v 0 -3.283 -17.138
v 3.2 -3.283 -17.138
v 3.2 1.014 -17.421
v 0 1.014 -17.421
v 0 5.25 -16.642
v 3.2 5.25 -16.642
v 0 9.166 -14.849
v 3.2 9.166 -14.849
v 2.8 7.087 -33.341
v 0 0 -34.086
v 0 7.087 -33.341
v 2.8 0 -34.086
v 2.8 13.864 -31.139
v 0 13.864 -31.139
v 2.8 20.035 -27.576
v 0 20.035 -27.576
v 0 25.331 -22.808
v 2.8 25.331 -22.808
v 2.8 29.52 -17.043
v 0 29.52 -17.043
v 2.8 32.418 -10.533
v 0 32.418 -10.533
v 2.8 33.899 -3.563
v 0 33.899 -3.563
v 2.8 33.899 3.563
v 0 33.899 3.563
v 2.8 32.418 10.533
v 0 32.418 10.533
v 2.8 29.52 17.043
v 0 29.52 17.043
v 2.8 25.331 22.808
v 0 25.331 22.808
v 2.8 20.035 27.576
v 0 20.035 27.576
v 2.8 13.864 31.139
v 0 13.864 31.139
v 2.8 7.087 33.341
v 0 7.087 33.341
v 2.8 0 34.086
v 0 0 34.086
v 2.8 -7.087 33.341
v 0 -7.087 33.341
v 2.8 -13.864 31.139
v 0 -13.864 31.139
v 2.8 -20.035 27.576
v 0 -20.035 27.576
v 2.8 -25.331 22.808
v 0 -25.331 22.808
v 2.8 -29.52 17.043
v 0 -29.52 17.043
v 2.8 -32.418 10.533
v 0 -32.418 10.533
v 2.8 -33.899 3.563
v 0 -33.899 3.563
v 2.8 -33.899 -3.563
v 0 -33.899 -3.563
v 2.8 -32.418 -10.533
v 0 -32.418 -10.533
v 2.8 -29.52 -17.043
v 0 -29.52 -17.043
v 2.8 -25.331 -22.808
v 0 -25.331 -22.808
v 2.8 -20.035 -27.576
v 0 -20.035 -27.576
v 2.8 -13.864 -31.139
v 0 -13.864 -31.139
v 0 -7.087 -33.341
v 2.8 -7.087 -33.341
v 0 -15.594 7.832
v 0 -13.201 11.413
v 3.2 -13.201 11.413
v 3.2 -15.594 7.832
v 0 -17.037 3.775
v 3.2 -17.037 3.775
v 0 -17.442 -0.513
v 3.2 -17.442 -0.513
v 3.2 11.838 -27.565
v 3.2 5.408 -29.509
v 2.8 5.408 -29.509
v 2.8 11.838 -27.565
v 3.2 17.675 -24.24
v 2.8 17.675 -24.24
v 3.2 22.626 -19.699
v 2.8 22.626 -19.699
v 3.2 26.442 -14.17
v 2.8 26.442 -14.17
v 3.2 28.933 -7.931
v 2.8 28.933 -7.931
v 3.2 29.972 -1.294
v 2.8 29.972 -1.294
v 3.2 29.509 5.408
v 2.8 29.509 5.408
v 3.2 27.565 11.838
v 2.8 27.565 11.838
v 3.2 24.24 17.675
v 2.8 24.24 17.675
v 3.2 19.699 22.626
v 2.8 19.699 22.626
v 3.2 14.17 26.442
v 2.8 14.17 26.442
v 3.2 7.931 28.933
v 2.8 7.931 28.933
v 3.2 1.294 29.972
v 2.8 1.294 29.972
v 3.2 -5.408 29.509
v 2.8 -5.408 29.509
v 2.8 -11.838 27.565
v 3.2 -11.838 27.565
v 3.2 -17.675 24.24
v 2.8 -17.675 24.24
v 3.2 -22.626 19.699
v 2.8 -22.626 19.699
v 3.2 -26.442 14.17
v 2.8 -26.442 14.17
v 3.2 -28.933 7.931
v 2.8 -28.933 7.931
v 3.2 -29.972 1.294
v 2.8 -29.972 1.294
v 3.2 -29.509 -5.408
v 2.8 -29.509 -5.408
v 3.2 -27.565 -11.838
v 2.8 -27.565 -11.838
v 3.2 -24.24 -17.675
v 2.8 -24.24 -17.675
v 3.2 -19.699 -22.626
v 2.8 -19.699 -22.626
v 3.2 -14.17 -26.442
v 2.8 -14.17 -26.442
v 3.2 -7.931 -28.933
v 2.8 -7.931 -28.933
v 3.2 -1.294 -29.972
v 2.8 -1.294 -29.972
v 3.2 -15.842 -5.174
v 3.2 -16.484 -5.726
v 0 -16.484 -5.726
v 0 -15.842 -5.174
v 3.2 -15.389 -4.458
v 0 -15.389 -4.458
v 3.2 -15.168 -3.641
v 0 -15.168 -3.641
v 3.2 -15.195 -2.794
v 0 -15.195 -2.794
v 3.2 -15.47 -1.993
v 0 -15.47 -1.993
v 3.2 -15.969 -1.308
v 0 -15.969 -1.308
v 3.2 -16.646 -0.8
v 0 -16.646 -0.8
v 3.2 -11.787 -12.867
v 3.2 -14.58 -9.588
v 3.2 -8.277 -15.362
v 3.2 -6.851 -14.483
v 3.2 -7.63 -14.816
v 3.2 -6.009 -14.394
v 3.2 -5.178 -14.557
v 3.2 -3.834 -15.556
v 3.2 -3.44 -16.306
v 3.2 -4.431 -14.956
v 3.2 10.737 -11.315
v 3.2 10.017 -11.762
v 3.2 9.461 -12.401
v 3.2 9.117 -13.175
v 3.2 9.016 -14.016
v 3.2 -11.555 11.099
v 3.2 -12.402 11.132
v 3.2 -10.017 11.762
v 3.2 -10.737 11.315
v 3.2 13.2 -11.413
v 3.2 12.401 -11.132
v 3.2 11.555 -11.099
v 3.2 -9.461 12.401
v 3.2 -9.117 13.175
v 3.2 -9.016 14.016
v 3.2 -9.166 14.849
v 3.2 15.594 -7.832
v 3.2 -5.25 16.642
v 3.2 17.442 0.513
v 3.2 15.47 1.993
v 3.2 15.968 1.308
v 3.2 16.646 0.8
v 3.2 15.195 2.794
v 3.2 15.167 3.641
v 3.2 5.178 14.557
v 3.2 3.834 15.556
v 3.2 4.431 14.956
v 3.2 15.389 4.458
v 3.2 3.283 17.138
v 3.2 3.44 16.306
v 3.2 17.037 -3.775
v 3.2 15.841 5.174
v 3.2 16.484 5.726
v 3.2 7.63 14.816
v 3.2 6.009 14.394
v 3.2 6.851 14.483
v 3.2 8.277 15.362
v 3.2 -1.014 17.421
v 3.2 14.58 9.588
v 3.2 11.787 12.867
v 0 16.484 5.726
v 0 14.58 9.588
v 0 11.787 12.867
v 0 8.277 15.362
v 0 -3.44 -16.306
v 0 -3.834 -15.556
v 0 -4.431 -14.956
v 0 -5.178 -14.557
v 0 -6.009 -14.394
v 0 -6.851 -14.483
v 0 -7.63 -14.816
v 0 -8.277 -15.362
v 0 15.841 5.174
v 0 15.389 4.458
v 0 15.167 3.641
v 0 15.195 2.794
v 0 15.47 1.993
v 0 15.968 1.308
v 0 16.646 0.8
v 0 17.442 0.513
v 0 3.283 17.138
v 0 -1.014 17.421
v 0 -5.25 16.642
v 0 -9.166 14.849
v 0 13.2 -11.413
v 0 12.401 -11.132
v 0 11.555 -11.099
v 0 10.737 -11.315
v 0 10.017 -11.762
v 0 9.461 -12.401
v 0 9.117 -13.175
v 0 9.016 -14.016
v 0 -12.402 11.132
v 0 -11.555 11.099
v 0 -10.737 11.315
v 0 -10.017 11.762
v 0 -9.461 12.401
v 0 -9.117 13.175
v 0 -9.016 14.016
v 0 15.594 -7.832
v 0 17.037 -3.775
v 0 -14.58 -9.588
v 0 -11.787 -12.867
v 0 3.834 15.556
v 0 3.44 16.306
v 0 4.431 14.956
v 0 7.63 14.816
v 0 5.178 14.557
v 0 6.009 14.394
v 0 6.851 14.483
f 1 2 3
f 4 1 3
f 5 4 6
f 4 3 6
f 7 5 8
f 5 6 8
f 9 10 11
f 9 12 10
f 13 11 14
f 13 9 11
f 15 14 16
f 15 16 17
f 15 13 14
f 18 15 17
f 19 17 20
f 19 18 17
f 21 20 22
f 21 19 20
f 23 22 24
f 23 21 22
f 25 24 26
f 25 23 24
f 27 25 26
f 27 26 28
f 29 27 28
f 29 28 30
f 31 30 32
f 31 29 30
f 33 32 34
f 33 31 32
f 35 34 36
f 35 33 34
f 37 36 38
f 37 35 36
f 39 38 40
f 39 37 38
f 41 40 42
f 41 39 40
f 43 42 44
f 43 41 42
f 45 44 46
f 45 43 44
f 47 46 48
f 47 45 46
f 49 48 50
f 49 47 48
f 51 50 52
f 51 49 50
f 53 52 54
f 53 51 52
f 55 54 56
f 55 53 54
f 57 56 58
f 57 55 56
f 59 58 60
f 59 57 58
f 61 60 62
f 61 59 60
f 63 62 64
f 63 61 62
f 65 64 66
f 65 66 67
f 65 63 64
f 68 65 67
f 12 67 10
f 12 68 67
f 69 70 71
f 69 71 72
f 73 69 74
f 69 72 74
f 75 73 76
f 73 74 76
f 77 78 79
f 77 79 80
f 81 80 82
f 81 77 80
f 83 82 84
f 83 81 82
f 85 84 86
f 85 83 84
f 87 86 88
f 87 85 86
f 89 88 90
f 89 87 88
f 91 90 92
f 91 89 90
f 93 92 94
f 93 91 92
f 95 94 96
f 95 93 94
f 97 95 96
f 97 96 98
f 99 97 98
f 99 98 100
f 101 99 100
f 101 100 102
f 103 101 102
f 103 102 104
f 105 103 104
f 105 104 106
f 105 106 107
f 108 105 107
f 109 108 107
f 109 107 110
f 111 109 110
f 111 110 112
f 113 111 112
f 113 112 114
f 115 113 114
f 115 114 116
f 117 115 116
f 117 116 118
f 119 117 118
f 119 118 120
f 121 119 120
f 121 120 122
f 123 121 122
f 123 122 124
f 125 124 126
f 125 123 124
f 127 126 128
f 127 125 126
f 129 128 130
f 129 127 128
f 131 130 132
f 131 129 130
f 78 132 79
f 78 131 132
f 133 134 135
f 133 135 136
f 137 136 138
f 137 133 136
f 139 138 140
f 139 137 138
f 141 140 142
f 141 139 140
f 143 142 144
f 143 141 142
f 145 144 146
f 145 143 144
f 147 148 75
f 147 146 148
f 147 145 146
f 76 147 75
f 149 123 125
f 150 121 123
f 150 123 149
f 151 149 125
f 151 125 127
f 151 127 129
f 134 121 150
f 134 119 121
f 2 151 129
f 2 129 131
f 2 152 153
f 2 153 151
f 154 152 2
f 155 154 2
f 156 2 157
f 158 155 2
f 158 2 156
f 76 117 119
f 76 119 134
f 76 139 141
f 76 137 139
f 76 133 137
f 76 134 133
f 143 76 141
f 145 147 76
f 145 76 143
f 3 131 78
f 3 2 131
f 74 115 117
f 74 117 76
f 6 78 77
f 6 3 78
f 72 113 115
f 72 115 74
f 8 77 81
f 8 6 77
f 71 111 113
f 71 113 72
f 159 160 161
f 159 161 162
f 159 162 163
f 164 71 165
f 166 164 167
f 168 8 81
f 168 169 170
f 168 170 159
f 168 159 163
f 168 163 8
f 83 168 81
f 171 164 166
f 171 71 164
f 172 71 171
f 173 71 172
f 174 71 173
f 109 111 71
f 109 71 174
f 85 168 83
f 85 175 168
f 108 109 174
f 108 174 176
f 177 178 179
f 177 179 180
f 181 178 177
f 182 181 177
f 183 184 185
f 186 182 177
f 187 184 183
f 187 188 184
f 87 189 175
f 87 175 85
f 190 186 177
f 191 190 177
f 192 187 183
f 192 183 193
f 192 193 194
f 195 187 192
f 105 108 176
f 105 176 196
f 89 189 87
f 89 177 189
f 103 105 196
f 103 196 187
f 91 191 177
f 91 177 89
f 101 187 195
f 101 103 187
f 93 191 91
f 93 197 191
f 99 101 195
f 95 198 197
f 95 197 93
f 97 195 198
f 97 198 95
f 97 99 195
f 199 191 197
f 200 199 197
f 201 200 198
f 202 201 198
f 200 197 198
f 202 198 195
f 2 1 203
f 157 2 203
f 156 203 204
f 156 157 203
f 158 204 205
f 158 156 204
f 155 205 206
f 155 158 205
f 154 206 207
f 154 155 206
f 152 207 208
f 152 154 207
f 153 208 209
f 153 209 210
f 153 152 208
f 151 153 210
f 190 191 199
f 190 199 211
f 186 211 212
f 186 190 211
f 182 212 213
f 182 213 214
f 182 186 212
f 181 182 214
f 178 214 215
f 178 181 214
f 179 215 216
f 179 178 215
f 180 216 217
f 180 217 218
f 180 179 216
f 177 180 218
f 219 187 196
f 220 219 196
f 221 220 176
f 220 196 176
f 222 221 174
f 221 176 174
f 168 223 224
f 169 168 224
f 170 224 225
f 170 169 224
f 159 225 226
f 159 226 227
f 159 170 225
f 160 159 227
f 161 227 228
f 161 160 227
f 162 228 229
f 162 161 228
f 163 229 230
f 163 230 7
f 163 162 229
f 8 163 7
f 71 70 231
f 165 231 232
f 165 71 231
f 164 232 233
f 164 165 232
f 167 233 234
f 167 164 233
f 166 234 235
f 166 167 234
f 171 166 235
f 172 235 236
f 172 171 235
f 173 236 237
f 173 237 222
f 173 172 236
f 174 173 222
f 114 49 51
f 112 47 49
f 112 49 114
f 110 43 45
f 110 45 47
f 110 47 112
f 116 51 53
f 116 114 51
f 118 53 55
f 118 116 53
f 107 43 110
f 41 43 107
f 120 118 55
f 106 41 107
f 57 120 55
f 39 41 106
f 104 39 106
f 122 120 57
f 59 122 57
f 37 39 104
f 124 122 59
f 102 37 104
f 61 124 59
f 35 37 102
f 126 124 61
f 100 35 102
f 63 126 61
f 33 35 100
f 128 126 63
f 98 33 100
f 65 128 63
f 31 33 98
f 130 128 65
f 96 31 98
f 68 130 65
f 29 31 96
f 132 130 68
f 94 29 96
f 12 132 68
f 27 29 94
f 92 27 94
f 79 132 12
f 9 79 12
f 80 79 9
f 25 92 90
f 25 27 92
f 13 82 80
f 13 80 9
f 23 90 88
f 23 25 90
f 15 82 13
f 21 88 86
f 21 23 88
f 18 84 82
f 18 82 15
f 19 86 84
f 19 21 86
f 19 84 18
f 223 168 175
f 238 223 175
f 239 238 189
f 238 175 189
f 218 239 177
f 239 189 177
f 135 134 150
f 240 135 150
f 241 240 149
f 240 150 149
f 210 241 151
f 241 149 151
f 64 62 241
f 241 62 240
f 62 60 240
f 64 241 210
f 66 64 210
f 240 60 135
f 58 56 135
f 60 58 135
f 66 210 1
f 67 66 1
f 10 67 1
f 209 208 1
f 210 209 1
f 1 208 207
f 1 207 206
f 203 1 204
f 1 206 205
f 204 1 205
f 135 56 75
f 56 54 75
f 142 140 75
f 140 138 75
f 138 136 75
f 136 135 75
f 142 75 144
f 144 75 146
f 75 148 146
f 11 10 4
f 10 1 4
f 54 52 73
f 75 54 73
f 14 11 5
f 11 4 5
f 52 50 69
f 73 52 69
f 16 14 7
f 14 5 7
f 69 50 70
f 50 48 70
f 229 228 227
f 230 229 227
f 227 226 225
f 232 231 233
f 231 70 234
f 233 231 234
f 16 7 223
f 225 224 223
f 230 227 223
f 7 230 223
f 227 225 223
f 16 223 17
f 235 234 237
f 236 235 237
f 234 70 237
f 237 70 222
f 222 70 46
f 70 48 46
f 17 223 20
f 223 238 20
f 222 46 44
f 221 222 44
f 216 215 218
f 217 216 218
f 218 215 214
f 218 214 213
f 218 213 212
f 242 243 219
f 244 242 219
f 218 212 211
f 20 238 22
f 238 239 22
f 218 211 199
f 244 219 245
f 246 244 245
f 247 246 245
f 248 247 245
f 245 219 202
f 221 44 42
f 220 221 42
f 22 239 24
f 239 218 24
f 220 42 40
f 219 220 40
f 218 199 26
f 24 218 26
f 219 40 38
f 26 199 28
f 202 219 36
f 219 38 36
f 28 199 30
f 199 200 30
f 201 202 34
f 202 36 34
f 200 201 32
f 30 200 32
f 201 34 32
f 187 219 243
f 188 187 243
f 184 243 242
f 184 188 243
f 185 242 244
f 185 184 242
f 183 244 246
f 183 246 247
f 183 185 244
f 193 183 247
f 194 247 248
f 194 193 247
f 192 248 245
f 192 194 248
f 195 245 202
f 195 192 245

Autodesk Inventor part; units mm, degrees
ref_plane "YZ Plane" through (0, 0, 0) normal (1, 0, 0) x (0, 1, 0)
ref_plane "XZ Plane" through (0, 0, 0) normal (0, 1, 0) x (-1, 0, 0)
ref_plane "XY Plane" through (0, 0, 0) normal (0, 0, 1) x (1, 0, 0)
sketch "Sketch_1" plane through (0, 0, 0) normal (0, 0, 1) x (1, 0, 0)
  line L0 (7.2, 0) -> (0, 0)
  line L1 (0, 8.5) -> (3.2, 8.5)
  line L2 (3.2, 8.5) -> (3.2, 105.8394)
  arc A0 (3.2, 105.8394) -> (2.2899, 109) centre (-4.7294, 105.2675) ccw
  line L3 (2.2899, 109) -> (0.7899, 109)
  arc A1 (0.7899, 109) -> (0, 105.8394) centre (7.9441, 105.5329) ccw
  line L4 (0, 105.8394) -> (0, 8.5)
  dimension "d16" = 1.5
  dimension "d17" = 3.2
revolve "Revolution1" add sketch "Sketch_1" angle 360 about axis through (7.2, 0, 0) along (1, 0, 0)
sketch "Sketch_2" plane through (3.6, 0, 0) normal (1, 0, 0) x (0, 0, -1)
  circle A0 centre (0, 0) radius 145.3333
  arc A1 (-108.9989, 0.5) -> (-108.9989, -0.5) centre (0, 0) ccw
  line L0 (-108.9989, -0.5) -> (-103.5248, -2.6502)
  arc A2 (-103.0895, -9.8477) -> (-103.5248, -2.6502) centre (-104.9781, -6.35) ccw
  line L1 (-103.0895, -9.8477) -> (-108.2644, -12.642)
  arc A3 (-108.2644, -12.642) -> (-108.1439, -13.6347) centre (0, 0) ccw
  line L2 (-108.1439, -13.6347) -> (-102.4506, -15.1094)
  arc A4 (-101.1508, -22.2019) -> (-102.4506, -15.1094) centre (-103.4473, -18.9574) ccw
  line L3 (-101.1508, -22.2019) -> (-105.9512, -25.5997)
  arc A5 (-105.9512, -25.5997) -> (-105.7119, -26.5706) centre (0, 0) ccw
  line L4 (-105.7119, -26.5706) -> (-99.8824, -27.3483)
  arc A6 (-97.7372, -34.2324) -> (-99.8824, -27.3483) centre (-100.408, -31.2884) ccw
  line L5 (-97.7372, -34.2324) -> (-102.093, -38.184)
  arc A7 (-102.093, -38.184) -> (-101.7384, -39.119) centre (0, 0) ccw
  line L6 (-101.7384, -39.119) -> (-95.8576, -39.1884)
  arc A8 (-92.8983, -45.7638) -> (-95.8576, -39.1884) centre (-95.9045, -43.1631) ccw
  line L7 (-92.8983, -45.7638) -> (-96.7461, -50.2116)
  arc A9 (-96.7461, -50.2116) -> (-96.2813, -51.097) centre (0, 0) ccw
  line L8 (-96.2813, -51.097) -> (-90.4351, -50.457)
  arc A10 (-86.7048, -56.6277) -> (-90.4351, -50.457) centre (-90.0025, -54.4084) ccw
  line L9 (-86.7048, -56.6277) -> (-89.9883, -61.5069)
  arc A11 (-89.9883, -61.5069) -> (-89.4203, -62.3299) centre (0, 0) ccw
  line L10 (-89.4203, -62.3299) -> (-83.6938, -60.9899)
  arc A12 (-79.2469, -66.666) -> (-83.6938, -60.9899) centre (-82.7881, -64.8603) ccw
  line L11 (-79.2469, -66.666) -> (-81.9184, -71.9054)
  arc A13 (-81.9184, -71.9054) -> (-81.2553, -72.6539) centre (0, 0) ccw
  line L12 (-81.2553, -72.6539) -> (-75.732, -70.6334)
  arc A14 (-70.6334, -75.732) -> (-75.732, -70.6334) centre (-74.3664, -74.3664) ccw
  line L13 (-70.6334, -75.732) -> (-72.6539, -81.2553)
  arc A15 (-72.6539, -81.2553) -> (-71.9054, -81.9184) centre (0, 0) ccw
  line L14 (-71.9054, -81.9184) -> (-66.666, -79.2469)
  arc A16 (-60.9899, -83.6938) -> (-66.666, -79.2469) centre (-64.8603, -82.7881) ccw
  line L15 (-60.9899, -83.6938) -> (-62.3299, -89.4203)
  arc A17 (-62.3299, -89.4203) -> (-61.5069, -89.9883) centre (0, 0) ccw
  line L16 (-61.5069, -89.9883) -> (-56.6277, -86.7048)
  arc A18 (-50.457, -90.4351) -> (-56.6277, -86.7048) centre (-54.4084, -90.0025) ccw
  line L17 (-50.457, -90.4351) -> (-51.097, -96.2813)
  arc A19 (-51.097, -96.2813) -> (-50.2116, -96.7461) centre (0, 0) ccw
  line L18 (-50.2116, -96.7461) -> (-45.7638, -92.8983)
  arc A20 (-39.1884, -95.8576) -> (-45.7638, -92.8983) centre (-43.1631, -95.9045) ccw
  line L19 (-39.1884, -95.8576) -> (-39.119, -101.7384)
  arc A21 (-39.119, -101.7384) -> (-38.184, -102.093) centre (0, 0) ccw
  line L20 (-38.184, -102.093) -> (-34.2324, -97.7372)
  arc A22 (-27.3483, -99.8824) -> (-34.2324, -97.7372) centre (-31.2884, -100.408) ccw
  line L21 (-27.3483, -99.8824) -> (-26.5706, -105.7119)
  arc A23 (-26.5706, -105.7119) -> (-25.5997, -105.9512) centre (0, 0) ccw
  line L22 (-25.5997, -105.9512) -> (-22.2019, -101.1508)
  arc A24 (-15.1094, -102.4506) -> (-22.2019, -101.1508) centre (-18.9574, -103.4473) ccw
  line L23 (-15.1094, -102.4506) -> (-13.6347, -108.1439)
  arc A25 (-13.6347, -108.1439) -> (-12.642, -108.2644) centre (0, 0) ccw
  line L24 (-12.642, -108.2644) -> (-9.8477, -103.0895)
  arc A26 (-2.6502, -103.5248) -> (-9.8477, -103.0895) centre (-6.35, -104.9781) ccw
  line L25 (-2.6502, -103.5248) -> (-0.5, -108.9989)
  arc A27 (-0.5, -108.9989) -> (0.5, -108.9989) centre (0, 0) ccw
  line L26 (0.5, -108.9989) -> (2.6502, -103.5248)
  arc A28 (9.8477, -103.0895) -> (2.6502, -103.5248) centre (6.35, -104.9781) ccw
  line L27 (9.8477, -103.0895) -> (12.642, -108.2644)
  arc A29 (12.642, -108.2644) -> (13.6347, -108.1439) centre (0, 0) ccw
  line L28 (13.6347, -108.1439) -> (15.1094, -102.4506)
  arc A30 (22.2019, -101.1508) -> (15.1094, -102.4506) centre (18.9574, -103.4473) ccw
  line L29 (22.2019, -101.1508) -> (25.5997, -105.9512)
  arc A31 (25.5997, -105.9512) -> (26.5706, -105.7119) centre (0, 0) ccw
  line L30 (26.5706, -105.7119) -> (27.3483, -99.8824)
  arc A32 (34.2324, -97.7372) -> (27.3483, -99.8824) centre (31.2884, -100.408) ccw
  line L31 (34.2324, -97.7372) -> (38.184, -102.093)
  arc A33 (38.184, -102.093) -> (39.119, -101.7384) centre (0, 0) ccw
  line L32 (39.119, -101.7384) -> (39.1884, -95.8576)
  arc A34 (45.7638, -92.8983) -> (39.1884, -95.8576) centre (43.1631, -95.9045) ccw
  line L33 (45.7638, -92.8983) -> (50.2116, -96.7461)
  arc A35 (50.2116, -96.7461) -> (51.097, -96.2813) centre (0, 0) ccw
  line L34 (51.097, -96.2813) -> (50.457, -90.4351)
  arc A36 (56.6277, -86.7048) -> (50.457, -90.4351) centre (54.4084, -90.0025) ccw
  line L35 (56.6277, -86.7048) -> (61.5069, -89.9883)
  arc A37 (61.5069, -89.9883) -> (62.3299, -89.4203) centre (0, 0) ccw
  line L36 (62.3299, -89.4203) -> (60.9899, -83.6938)
  arc A38 (66.666, -79.2469) -> (60.9899, -83.6938) centre (64.8603, -82.7881) ccw
  line L37 (66.666, -79.2469) -> (71.9054, -81.9184)
  arc A39 (71.9054, -81.9184) -> (72.6539, -81.2553) centre (0, 0) ccw
  line L38 (72.6539, -81.2553) -> (70.6334, -75.732)
  arc A40 (75.732, -70.6334) -> (70.6334, -75.732) centre (74.3664, -74.3664) ccw
  line L39 (75.732, -70.6334) -> (81.2553, -72.6539)
  arc A41 (81.2553, -72.6539) -> (81.9184, -71.9054) centre (0, 0) ccw
  line L40 (81.9184, -71.9054) -> (79.2469, -66.666)
  arc A42 (83.6938, -60.9899) -> (79.2469, -66.666) centre (82.7881, -64.8603) ccw
  line L41 (83.6938, -60.9899) -> (89.4203, -62.3299)
  arc A43 (89.4203, -62.3299) -> (89.9883, -61.5069) centre (0, 0) ccw
  line L42 (89.9883, -61.5069) -> (86.7048, -56.6277)
  arc A44 (90.4351, -50.457) -> (86.7048, -56.6277) centre (90.0025, -54.4084) ccw
  line L43 (90.4351, -50.457) -> (96.2813, -51.097)
  arc A45 (96.2813, -51.097) -> (96.7461, -50.2116) centre (0, 0) ccw
  line L44 (96.7461, -50.2116) -> (92.8983, -45.7638)
  arc A46 (95.8576, -39.1884) -> (92.8983, -45.7638) centre (95.9045, -43.1631) ccw
  line L45 (95.8576, -39.1884) -> (101.7384, -39.119)
  arc A47 (101.7384, -39.119) -> (102.093, -38.184) centre (0, 0) ccw
  line L46 (102.093, -38.184) -> (97.7372, -34.2324)
  arc A48 (99.8824, -27.3483) -> (97.7372, -34.2324) centre (100.408, -31.2884) ccw
  line L47 (99.8824, -27.3483) -> (105.7119, -26.5706)
  arc A49 (105.7119, -26.5706) -> (105.9512, -25.5997) centre (0, 0) ccw
  line L48 (105.9512, -25.5997) -> (101.1508, -22.2019)
  arc A50 (102.4506, -15.1094) -> (101.1508, -22.2019) centre (103.4473, -18.9574) ccw
  line L49 (102.4506, -15.1094) -> (108.1439, -13.6347)
  arc A51 (108.1439, -13.6347) -> (108.2644, -12.642) centre (0, 0) ccw
  line L50 (108.2644, -12.642) -> (103.0895, -9.8477)
  arc A52 (103.5248, -2.6502) -> (103.0895, -9.8477) centre (104.9781, -6.35) ccw
  line L51 (103.5248, -2.6502) -> (108.9989, -0.5)
  arc A53 (108.9989, -0.5) -> (108.9989, 0.5) centre (0, 0) ccw
  line L52 (108.9989, 0.5) -> (103.5248, 2.6502)
  arc A54 (103.0895, 9.8477) -> (103.5248, 2.6502) centre (104.9781, 6.35) ccw
  line L53 (103.0895, 9.8477) -> (108.2644, 12.642)
  arc A55 (108.2644, 12.642) -> (108.1439, 13.6347) centre (0, 0) ccw
  line L54 (108.1439, 13.6347) -> (102.4506, 15.1094)
  arc A56 (101.1508, 22.2019) -> (102.4506, 15.1094) centre (103.4473, 18.9574) ccw
  line L55 (101.1508, 22.2019) -> (105.9512, 25.5997)
  arc A57 (105.9512, 25.5997) -> (105.7119, 26.5706) centre (0, 0) ccw
  line L56 (105.7119, 26.5706) -> (99.8824, 27.3483)
  arc A58 (97.7372, 34.2324) -> (99.8824, 27.3483) centre (100.408, 31.2884) ccw
  line L57 (97.7372, 34.2324) -> (102.093, 38.184)
  arc A59 (102.093, 38.184) -> (101.7384, 39.119) centre (0, 0) ccw
  line L58 (101.7384, 39.119) -> (95.8576, 39.1884)
  arc A60 (92.8983, 45.7638) -> (95.8576, 39.1884) centre (95.9045, 43.1631) ccw
  line L59 (92.8983, 45.7638) -> (96.7461, 50.2116)
  arc A61 (96.7461, 50.2116) -> (96.2813, 51.097) centre (0, 0) ccw
  line L60 (96.2813, 51.097) -> (90.4351, 50.457)
  arc A62 (86.7048, 56.6277) -> (90.4351, 50.457) centre (90.0025, 54.4084) ccw
  line L61 (86.7048, 56.6277) -> (89.9883, 61.5069)
  arc A63 (89.9883, 61.5069) -> (89.4203, 62.3299) centre (0, 0) ccw
  line L62 (89.4203, 62.3299) -> (83.6938, 60.9899)
  arc A64 (79.2469, 66.666) -> (83.6938, 60.9899) centre (82.7881, 64.8603) ccw
  line L63 (79.2469, 66.666) -> (81.9184, 71.9054)
  arc A65 (81.9184, 71.9054) -> (81.2553, 72.6539) centre (0, 0) ccw
  line L64 (81.2553, 72.6539) -> (75.732, 70.6334)
  arc A66 (70.6334, 75.732) -> (75.732, 70.6334) centre (74.3664, 74.3664) ccw
  line L65 (70.6334, 75.732) -> (72.6539, 81.2553)
  arc A67 (72.6539, 81.2553) -> (71.9054, 81.9184) centre (0, 0) ccw
  line L66 (71.9054, 81.9184) -> (66.666, 79.2469)
  arc A68 (60.9899, 83.6938) -> (66.666, 79.2469) centre (64.8603, 82.7881) ccw
  line L67 (60.9899, 83.6938) -> (62.3299, 89.4203)
  arc A69 (62.3299, 89.4203) -> (61.5069, 89.9883) centre (0, 0) ccw
  line L68 (61.5069, 89.9883) -> (56.6277, 86.7048)
  arc A70 (50.457, 90.4351) -> (56.6277, 86.7048) centre (54.4084, 90.0025) ccw
  line L69 (50.457, 90.4351) -> (51.097, 96.2813)
  arc A71 (51.097, 96.2813) -> (50.2116, 96.7461) centre (0, 0) ccw
  line L70 (50.2116, 96.7461) -> (45.7638, 92.8983)
  arc A72 (39.1884, 95.8576) -> (45.7638, 92.8983) centre (43.1631, 95.9045) ccw
  line L71 (39.1884, 95.8576) -> (39.119, 101.7384)
  arc A73 (39.119, 101.7384) -> (38.184, 102.093) centre (0, 0) ccw
  line L72 (38.184, 102.093) -> (34.2324, 97.7372)
  arc A74 (27.3483, 99.8824) -> (34.2324, 97.7372) centre (31.2884, 100.408) ccw
  line L73 (27.3483, 99.8824) -> (26.5706, 105.7119)
  arc A75 (26.5706, 105.7119) -> (25.5997, 105.9512) centre (0, 0) ccw
  line L74 (25.5997, 105.9512) -> (22.2019, 101.1508)
  arc A76 (15.1094, 102.4506) -> (22.2019, 101.1508) centre (18.9574, 103.4473) ccw
  line L75 (15.1094, 102.4506) -> (13.6347, 108.1439)
  arc A77 (13.6347, 108.1439) -> (12.642, 108.2644) centre (0, 0) ccw
  line L76 (12.642, 108.2644) -> (9.8477, 103.0895)
  arc A78 (2.6502, 103.5248) -> (9.8477, 103.0895) centre (6.35, 104.9781) ccw
  line L77 (2.6502, 103.5248) -> (0.5, 108.9989)
  arc A79 (0.5, 108.9989) -> (-0.5, 108.9989) centre (0, 0) ccw
  line L78 (-0.5, 108.9989) -> (-2.6502, 103.5248)
  arc A80 (-9.8477, 103.0895) -> (-2.6502, 103.5248) centre (-6.35, 104.9781) ccw
  line L79 (-9.8477, 103.0895) -> (-12.642, 108.2644)
  arc A81 (-12.642, 108.2644) -> (-13.6347, 108.1439) centre (0, 0) ccw
  line L80 (-13.6347, 108.1439) -> (-15.1094, 102.4506)
  arc A82 (-22.2019, 101.1508) -> (-15.1094, 102.4506) centre (-18.9574, 103.4473) ccw
  line L81 (-22.2019, 101.1508) -> (-25.5997, 105.9512)
  arc A83 (-25.5997, 105.9512) -> (-26.5706, 105.7119) centre (0, 0) ccw
  line L82 (-26.5706, 105.7119) -> (-27.3483, 99.8824)
  arc A84 (-34.2324, 97.7372) -> (-27.3483, 99.8824) centre (-31.2884, 100.408) ccw
  line L83 (-34.2324, 97.7372) -> (-38.184, 102.093)
  arc A85 (-38.184, 102.093) -> (-39.119, 101.7384) centre (0, 0) ccw
  line L84 (-39.119, 101.7384) -> (-39.1884, 95.8576)
  arc A86 (-45.7638, 92.8983) -> (-39.1884, 95.8576) centre (-43.1631, 95.9045) ccw
  line L85 (-45.7638, 92.8983) -> (-50.2116, 96.7461)
  arc A87 (-50.2116, 96.7461) -> (-51.097, 96.2813) centre (0, 0) ccw
  line L86 (-51.097, 96.2813) -> (-50.457, 90.4351)
  arc A88 (-56.6277, 86.7048) -> (-50.457, 90.4351) centre (-54.4084, 90.0025) ccw
  line L87 (-56.6277, 86.7048) -> (-61.5069, 89.9883)
  arc A89 (-61.5069, 89.9883) -> (-62.3299, 89.4203) centre (0, 0) ccw
  line L88 (-62.3299, 89.4203) -> (-60.9899, 83.6938)
  arc A90 (-66.666, 79.2469) -> (-60.9899, 83.6938) centre (-64.8603, 82.7881) ccw
  line L89 (-66.666, 79.2469) -> (-71.9054, 81.9184)
  arc A91 (-71.9054, 81.9184) -> (-72.6539, 81.2553) centre (0, 0) ccw
  line L90 (-72.6539, 81.2553) -> (-70.6334, 75.732)
  arc A92 (-75.732, 70.6334) -> (-70.6334, 75.732) centre (-74.3664, 74.3664) ccw
  line L91 (-75.732, 70.6334) -> (-81.2553, 72.6539)
  arc A93 (-81.2553, 72.6539) -> (-81.9184, 71.9054) centre (0, 0) ccw
  line L92 (-81.9184, 71.9054) -> (-79.2469, 66.666)
  arc A94 (-83.6938, 60.9899) -> (-79.2469, 66.666) centre (-82.7881, 64.8603) ccw
  line L93 (-83.6938, 60.9899) -> (-89.4203, 62.3299)
  arc A95 (-89.4203, 62.3299) -> (-89.9883, 61.5069) centre (0, 0) ccw
  line L94 (-89.9883, 61.5069) -> (-86.7048, 56.6277)
  arc A96 (-90.4351, 50.457) -> (-86.7048, 56.6277) centre (-90.0025, 54.4084) ccw
  line L95 (-90.4351, 50.457) -> (-96.2813, 51.097)
  arc A97 (-96.2813, 51.097) -> (-96.7461, 50.2116) centre (0, 0) ccw
  line L96 (-96.7461, 50.2116) -> (-92.8983, 45.7638)
  arc A98 (-95.8576, 39.1884) -> (-92.8983, 45.7638) centre (-95.9045, 43.1631) ccw
  line L97 (-95.8576, 39.1884) -> (-101.7384, 39.119)
  arc A99 (-101.7384, 39.119) -> (-102.093, 38.184) centre (0, 0) ccw
  line L98 (-102.093, 38.184) -> (-97.7372, 34.2324)
  arc A100 (-99.8824, 27.3483) -> (-97.7372, 34.2324) centre (-100.408, 31.2884) ccw
  line L99 (-99.8824, 27.3483) -> (-105.7119, 26.5706)
  arc A101 (-105.7119, 26.5706) -> (-105.9512, 25.5997) centre (0, 0) ccw
  line L100 (-105.9512, 25.5997) -> (-101.1508, 22.2019)
  arc A102 (-102.4506, 15.1094) -> (-101.1508, 22.2019) centre (-103.4473, 18.9574) ccw
  line L101 (-102.4506, 15.1094) -> (-108.1439, 13.6347)
  arc A103 (-108.1439, 13.6347) -> (-108.2644, 12.642) centre (0, 0) ccw
  line L102 (-108.2644, 12.642) -> (-103.0895, 9.8477)
  arc A104 (-103.5248, 2.6502) -> (-103.0895, 9.8477) centre (-104.9781, 6.35) ccw
  line L103 (-103.5248, 2.6502) -> (-108.9989, 0.5)
extrude "Extrusion1" cut sketch "Sketch_2" along normal mid plane 7.6
sketch "スケッチ4" plane through (3.2, 18.9574, -103.4473) normal (1, 0, 0) x (0, 0.180255, -0.9836199)
  line L0 (-1.9941, -8.896) -> (0.3565, -8.1331) projected
  arc A0 (0.3565, -8.1331) -> (0.5674, -4.646) centre (-105.17, 0) ccw projected
  line L1 (0.5674, -4.646) -> (-1.674, -3.6053) projected
  arc A1 (-1.674, 3.6053) -> (-1.674, -3.6053) centre (0, 0) ccw projected
  line L2 (-1.674, 3.6053) -> (0.5674, 4.646) projected
  arc A2 (0.5674, 4.646) -> (0.3565, 8.1331) centre (-105.17, 0) ccw projected
  line L3 (0.3565, 8.1331) -> (-1.9941, 8.896) projected
  arc A3 (-2.8632, 16.0541) -> (-1.9941, 8.896) centre (-0.7668, 12.6768) ccw projected
  line L4 (-2.8632, 16.0541) -> (-0.7636, 17.3574) projected
  arc A4 (-0.7636, 17.3574) -> (-1.3933, 20.7936) centre (-105.17, 0) ccw projected
  line L5 (-1.3933, 20.7936) -> (-3.8186, 21.2677) projected
  arc A5 (-5.5442, 28.2688) -> (-3.8186, 21.2677) centre (-3.056, 25.1688) ccw projected
  line L6 (-5.5442, 28.2688) -> (-3.617, 29.8157) projected
  arc A6 (-3.617, 29.8157) -> (-4.6563, 33.1509) centre (-105.17, 0) ccw projected
  line L7 (-4.6563, 33.1509) -> (-7.1211, 33.3292) projected
  arc A7 (-9.678, 40.0712) -> (-7.1211, 33.3292) centre (-6.8343, 37.2938) ccw projected
  line L8 (-9.678, 40.0712) -> (-7.9513, 41.8391) projected
  arc A8 (-7.9513, 41.8391) -> (-9.3851, 45.0247) centre (-105.17, 0) ccw projected
  line L9 (-9.3851, 45.0247) -> (-11.8534, 44.9046) projected
  arc A9 (-15.2043, 51.2893) -> (-11.8534, 44.9046) centre (-12.0466, 48.8749) ccw projected
  line L10 (-15.2043, 51.2893) -> (-13.7033, 53.2525) projected
  arc A10 (-13.7033, 53.2525) -> (-15.5106, 56.2421) centre (-105.17, 0) ccw projected
  line L11 (-15.5106, 56.2421) -> (-17.9464, 55.8253) projected
  arc A11 (-22.0425, 61.7595) -> (-17.9464, 55.8253) centre (-18.6168, 59.7434) ccw projected
  line L12 (-22.0425, 61.7595) -> (-20.7891, 63.8893) projected
  arc A12 (-20.7891, 63.8893) -> (-22.9435, 66.6392) centre (-105.17, 0) ccw projected
  line L13 (-22.9435, 66.6392) -> (-25.3114, 65.9319) projected
  arc A13 (-30.0929, 71.3291) -> (-25.3114, 65.9319) centre (-26.4491, 69.7406) ccw projected
  line L14 (-30.0929, 71.3291) -> (-29.1053, 73.5945) projected
  arc A14 (-29.1053, 73.5945) -> (-31.5755, 76.0647) centre (-105.17, 0) ccw projected
  line L15 (-31.5755, 76.0647) -> (-33.8409, 75.0771) projected
  arc A15 (-39.2381, 79.8586) -> (-33.8409, 75.0771) centre (-35.4294, 78.7209) ccw projected
  line L16 (-39.2381, 79.8586) -> (-38.5308, 82.2265) projected
  arc A16 (-38.5308, 82.2265) -> (-41.2807, 84.3809) centre (-105.17, 0) ccw projected
  line L17 (-41.2807, 84.3809) -> (-43.4105, 83.1275) projected
  arc A17 (-49.3447, 87.2236) -> (-43.4105, 83.1275) centre (-45.4266, 86.5532) ccw projected
  line L18 (-49.3447, 87.2236) -> (-48.9279, 89.6594) projected
  arc A18 (-48.9279, 89.6594) -> (-51.9175, 91.4667) centre (-105.17, 0) ccw projected
  line L19 (-51.9175, 91.4667) -> (-53.8807, 89.9657) projected
  arc A19 (-60.2654, 93.3166) -> (-53.8807, 89.9657) centre (-56.2951, 93.1234) ccw projected
  line L20 (-60.2654, 93.3166) -> (-60.1453, 95.7849) projected
  arc A20 (-60.1453, 95.7849) -> (-63.3309, 97.2187) centre (-105.17, 0) ccw projected
  line L21 (-63.3309, 97.2187) -> (-65.0988, 95.492) projected
  arc A21 (-71.8408, 98.0489) -> (-65.0988, 95.492) centre (-67.8762, 98.3357) ccw projected
  line L22 (-71.8408, 98.0489) -> (-72.0191, 100.5137) projected
  arc A22 (-72.0191, 100.5137) -> (-75.3543, 101.553) centre (-105.17, 0) ccw projected
  line L23 (-75.3543, 101.553) -> (-76.9012, 99.6258) projected
  arc A23 (-83.9023, 101.3514) -> (-76.9012, 99.6258) centre (-80.0012, 102.114) ccw projected
  line L24 (-83.9023, 101.3514) -> (-84.3764, 103.7767) projected
  arc A24 (-84.3764, 103.7767) -> (-87.8126, 104.4064) centre (-105.17, 0) ccw projected
  line L25 (-87.8126, 104.4064) -> (-89.1159, 102.3068) projected
  arc A25 (-96.274, 103.1759) -> (-89.1159, 102.3068) centre (-92.4932, 104.4032) ccw projected
  line L26 (-96.274, 103.1759) -> (-97.0369, 105.5265) projected
  arc A26 (-97.0369, 105.5265) -> (-100.524, 105.7374) centre (-105.17, 0) ccw projected
  line L27 (-100.524, 105.7374) -> (-101.5647, 103.496) projected
  arc A27 (-108.7753, 103.496) -> (-101.5647, 103.496) centre (-105.17, 105.17) ccw projected
  line L28 (-108.7753, 103.496) -> (-109.816, 105.7374) projected
  arc A28 (-109.816, 105.7374) -> (-113.3031, 105.5265) centre (-105.17, 0) ccw projected
  line L29 (-113.3031, 105.5265) -> (-114.066, 103.1759) projected
  arc A29 (-121.2241, 102.3068) -> (-114.066, 103.1759) centre (-117.8468, 104.4032) ccw projected
  line L30 (-121.2241, 102.3068) -> (-122.5274, 104.4064) projected
  arc A30 (-122.5274, 104.4064) -> (-125.9636, 103.7767) centre (-105.17, 0) ccw projected
  line L31 (-125.9636, 103.7767) -> (-126.4377, 101.3514) projected
  arc A31 (-133.4388, 99.6258) -> (-126.4377, 101.3514) centre (-130.3388, 102.114) ccw projected
  line L32 (-133.4388, 99.6258) -> (-134.9857, 101.553) projected
  arc A32 (-134.9857, 101.553) -> (-138.3209, 100.5137) centre (-105.17, 0) ccw projected
  line L33 (-138.3209, 100.5137) -> (-138.4992, 98.0489) projected
  arc A33 (-145.2412, 95.492) -> (-138.4992, 98.0489) centre (-142.4638, 98.3357) ccw projected
  line L34 (-145.2412, 95.492) -> (-147.0091, 97.2187) projected
  arc A34 (-147.0091, 97.2187) -> (-150.1947, 95.7849) centre (-105.17, 0) ccw projected
  line L35 (-150.1947, 95.7849) -> (-150.0746, 93.3166) projected
  arc A35 (-156.4593, 89.9657) -> (-150.0746, 93.3166) centre (-154.0449, 93.1234) ccw projected
  line L36 (-156.4593, 89.9657) -> (-158.4225, 91.4667) projected
  arc A36 (-158.4225, 91.4667) -> (-161.4121, 89.6594) centre (-105.17, 0) ccw projected
  line L37 (-161.4121, 89.6594) -> (-160.9953, 87.2236) projected
  arc A37 (-166.9295, 83.1275) -> (-160.9953, 87.2236) centre (-164.9134, 86.5532) ccw projected
  line L38 (-166.9295, 83.1275) -> (-169.0593, 84.3809) projected
  arc A38 (-169.0593, 84.3809) -> (-171.8092, 82.2265) centre (-105.17, 0) ccw projected
  line L39 (-171.8092, 82.2265) -> (-171.1019, 79.8586) projected
  arc A39 (-176.4991, 75.0771) -> (-171.1019, 79.8586) centre (-174.9106, 78.7209) ccw projected
  line L40 (-176.4991, 75.0771) -> (-178.7645, 76.0647) projected
  arc A40 (-178.7645, 76.0647) -> (-181.2347, 73.5945) centre (-105.17, 0) ccw projected
  line L41 (-181.2347, 73.5945) -> (-180.2471, 71.3291) projected
  arc A41 (-185.0286, 65.9319) -> (-180.2471, 71.3291) centre (-183.8909, 69.7406) ccw projected
  line L42 (-185.0286, 65.9319) -> (-187.3965, 66.6392) projected
  arc A42 (-187.3965, 66.6392) -> (-189.5509, 63.8893) centre (-105.17, 0) ccw projected
  line L43 (-189.5509, 63.8893) -> (-188.2975, 61.7595) projected
  arc A43 (-192.3936, 55.8253) -> (-188.2975, 61.7595) centre (-191.7232, 59.7434) ccw projected
  line L44 (-192.3936, 55.8253) -> (-194.8294, 56.2421) projected
  arc A44 (-194.8294, 56.2421) -> (-196.6367, 53.2525) centre (-105.17, 0) ccw projected
  line L45 (-196.6367, 53.2525) -> (-195.1357, 51.2893) projected
  arc A45 (-198.4866, 44.9046) -> (-195.1357, 51.2893) centre (-198.2934, 48.8749) ccw projected
  line L46 (-198.4866, 44.9046) -> (-200.9549, 45.0247) projected
  arc A46 (-200.9549, 45.0247) -> (-202.3887, 41.8391) centre (-105.17, 0) ccw projected
  line L47 (-202.3887, 41.8391) -> (-200.662, 40.0712) projected
  arc A47 (-203.2189, 33.3292) -> (-200.662, 40.0712) centre (-203.5057, 37.2938) ccw projected
  line L48 (-203.2189, 33.3292) -> (-205.6837, 33.1509) projected
  arc A48 (-205.6837, 33.1509) -> (-206.723, 29.8157) centre (-105.17, 0) ccw projected
  line L49 (-206.723, 29.8157) -> (-204.7958, 28.2688) projected
  arc A49 (-206.5214, 21.2677) -> (-204.7958, 28.2688) centre (-207.284, 25.1688) ccw projected
  line L50 (-206.5214, 21.2677) -> (-208.9467, 20.7936) projected
  arc A50 (-208.9467, 20.7936) -> (-209.5764, 17.3574) centre (-105.17, 0) ccw projected
  line L51 (-209.5764, 17.3574) -> (-207.4768, 16.0541) projected
  arc A51 (-208.3459, 8.896) -> (-207.4768, 16.0541) centre (-209.5732, 12.6768) ccw projected
  line L52 (-208.3459, 8.896) -> (-210.6965, 8.1331) projected
  arc A52 (-210.6965, 8.1331) -> (-210.9074, 4.646) centre (-105.17, 0) ccw projected
  line L53 (-210.9074, 4.646) -> (-208.666, 3.6053) projected
  arc A53 (-208.666, -3.6053) -> (-208.666, 3.6053) centre (-210.34, 0) ccw projected
  line L54 (-208.666, -3.6053) -> (-210.9074, -4.646) projected
  arc A54 (-210.9074, -4.646) -> (-210.6965, -8.1331) centre (-105.17, 0) ccw projected
  line L55 (-210.6965, -8.1331) -> (-208.3459, -8.896) projected
  arc A55 (-207.4768, -16.0541) -> (-208.3459, -8.896) centre (-209.5732, -12.6768) ccw projected
  line L56 (-207.4768, -16.0541) -> (-209.5764, -17.3574) projected
  arc A56 (-209.5764, -17.3574) -> (-208.9467, -20.7936) centre (-105.17, 0) ccw projected
  line L57 (-208.9467, -20.7936) -> (-206.5214, -21.2677) projected
  arc A57 (-204.7958, -28.2688) -> (-206.5214, -21.2677) centre (-207.284, -25.1688) ccw projected
  line L58 (-204.7958, -28.2688) -> (-206.723, -29.8157) projected
  arc A58 (-206.723, -29.8157) -> (-205.6837, -33.1509) centre (-105.17, 0) ccw projected
  line L59 (-205.6837, -33.1509) -> (-203.2189, -33.3292) projected
  arc A59 (-200.662, -40.0712) -> (-203.2189, -33.3292) centre (-203.5057, -37.2938) ccw projected
  line L60 (-200.662, -40.0712) -> (-202.3887, -41.8391) projected
  arc A60 (-202.3887, -41.8391) -> (-200.9549, -45.0247) centre (-105.17, 0) ccw projected
  line L61 (-200.9549, -45.0247) -> (-198.4866, -44.9046) projected
  arc A61 (-195.1357, -51.2893) -> (-198.4866, -44.9046) centre (-198.2934, -48.8749) ccw projected
  line L62 (-195.1357, -51.2893) -> (-196.6367, -53.2525) projected
  arc A62 (-196.6367, -53.2525) -> (-194.8294, -56.2421) centre (-105.17, 0) ccw projected
  line L63 (-194.8294, -56.2421) -> (-192.3936, -55.8253) projected
  arc A63 (-188.2975, -61.7595) -> (-192.3936, -55.8253) centre (-191.7232, -59.7434) ccw projected
  line L64 (-188.2975, -61.7595) -> (-189.5509, -63.8893) projected
  arc A64 (-189.5509, -63.8893) -> (-187.3965, -66.6392) centre (-105.17, 0) ccw projected
  line L65 (-187.3965, -66.6392) -> (-185.0286, -65.9319) projected
  arc A65 (-180.2471, -71.3291) -> (-185.0286, -65.9319) centre (-183.8909, -69.7406) ccw projected
  line L66 (-180.2471, -71.3291) -> (-181.2347, -73.5945) projected
  arc A66 (-181.2347, -73.5945) -> (-178.7645, -76.0647) centre (-105.17, 0) ccw projected
  line L67 (-178.7645, -76.0647) -> (-176.4991, -75.0771) projected
  arc A67 (-171.1019, -79.8586) -> (-176.4991, -75.0771) centre (-174.9106, -78.7209) ccw projected
  line L68 (-171.1019, -79.8586) -> (-171.8092, -82.2265) projected
  arc A68 (-171.8092, -82.2265) -> (-169.0593, -84.3809) centre (-105.17, 0) ccw projected
  line L69 (-169.0593, -84.3809) -> (-166.9295, -83.1275) projected
  arc A69 (-160.9953, -87.2236) -> (-166.9295, -83.1275) centre (-164.9134, -86.5532) ccw projected
  line L70 (-160.9953, -87.2236) -> (-161.4121, -89.6594) projected
  arc A70 (-161.4121, -89.6594) -> (-158.4225, -91.4667) centre (-105.17, 0) ccw projected
  line L71 (-158.4225, -91.4667) -> (-156.4593, -89.9657) projected
  arc A71 (-150.0746, -93.3166) -> (-156.4593, -89.9657) centre (-154.0449, -93.1234) ccw projected
  line L72 (-150.0746, -93.3166) -> (-150.1947, -95.7849) projected
  arc A72 (-150.1947, -95.7849) -> (-147.0091, -97.2187) centre (-105.17, 0) ccw projected
  line L73 (-147.0091, -97.2187) -> (-145.2412, -95.492) projected
  arc A73 (-138.4992, -98.0489) -> (-145.2412, -95.492) centre (-142.4638, -98.3357) ccw projected
  line L74 (-138.4992, -98.0489) -> (-138.3209, -100.5137) projected
  arc A74 (-138.3209, -100.5137) -> (-134.9857, -101.553) centre (-105.17, 0) ccw projected
  line L75 (-134.9857, -101.553) -> (-133.4388, -99.6258) projected
  arc A75 (-126.4377, -101.3514) -> (-133.4388, -99.6258) centre (-130.3388, -102.114) ccw projected
  line L76 (-126.4377, -101.3514) -> (-125.9636, -103.7767) projected
  arc A76 (-125.9636, -103.7767) -> (-122.5274, -104.4064) centre (-105.17, 0) ccw projected
  line L77 (-122.5274, -104.4064) -> (-121.2241, -102.3068) projected
  arc A77 (-114.066, -103.1759) -> (-121.2241, -102.3068) centre (-117.8468, -104.4032) ccw projected
  line L78 (-114.066, -103.1759) -> (-113.3031, -105.5265) projected
  arc A78 (-113.3031, -105.5265) -> (-109.816, -105.7374) centre (-105.17, 0) ccw projected
  line L79 (-109.816, -105.7374) -> (-108.7753, -103.496) projected
  arc A79 (-101.5647, -103.496) -> (-108.7753, -103.496) centre (-105.17, -105.17) ccw projected
  line L80 (-101.5647, -103.496) -> (-100.524, -105.7374) projected
  arc A80 (-100.524, -105.7374) -> (-97.0369, -105.5265) centre (-105.17, 0) ccw projected
  line L81 (-97.0369, -105.5265) -> (-96.274, -103.1759) projected
  arc A81 (-89.1159, -102.3068) -> (-96.274, -103.1759) centre (-92.4932, -104.4032) ccw projected
  line L82 (-89.1159, -102.3068) -> (-87.8126, -104.4064) projected
  arc A82 (-87.8126, -104.4064) -> (-84.3764, -103.7767) centre (-105.17, 0) ccw projected
  line L83 (-84.3764, -103.7767) -> (-83.9023, -101.3514) projected
  arc A83 (-76.9012, -99.6258) -> (-83.9023, -101.3514) centre (-80.0012, -102.114) ccw projected
  line L84 (-76.9012, -99.6258) -> (-75.3543, -101.553) projected
  arc A84 (-75.3543, -101.553) -> (-72.0191, -100.5137) centre (-105.17, 0) ccw projected
  line L85 (-72.0191, -100.5137) -> (-71.8408, -98.0489) projected
  arc A85 (-65.0988, -95.492) -> (-71.8408, -98.0489) centre (-67.8762, -98.3357) ccw projected
  line L86 (-65.0988, -95.492) -> (-63.3309, -97.2187) projected
  arc A86 (-63.3309, -97.2187) -> (-60.1453, -95.7849) centre (-105.17, 0) ccw projected
  line L87 (-60.1453, -95.7849) -> (-60.2654, -93.3166) projected
  arc A87 (-53.8807, -89.9657) -> (-60.2654, -93.3166) centre (-56.2951, -93.1234) ccw projected
  line L88 (-53.8807, -89.9657) -> (-51.9175, -91.4667) projected
  arc A88 (-51.9175, -91.4667) -> (-48.9279, -89.6594) centre (-105.17, 0) ccw projected
  line L89 (-48.9279, -89.6594) -> (-49.3447, -87.2236) projected
  arc A89 (-43.4105, -83.1275) -> (-49.3447, -87.2236) centre (-45.4266, -86.5532) ccw projected
  line L90 (-43.4105, -83.1275) -> (-41.2807, -84.3809) projected
  arc A90 (-41.2807, -84.3809) -> (-38.5308, -82.2265) centre (-105.17, 0) ccw projected
  line L91 (-38.5308, -82.2265) -> (-39.2381, -79.8586) projected
  arc A91 (-33.8409, -75.0771) -> (-39.2381, -79.8586) centre (-35.4294, -78.7209) ccw projected
  line L92 (-33.8409, -75.0771) -> (-31.5755, -76.0647) projected
  arc A92 (-31.5755, -76.0647) -> (-29.1053, -73.5945) centre (-105.17, 0) ccw projected
  line L93 (-29.1053, -73.5945) -> (-30.0929, -71.3291) projected
  arc A93 (-25.3114, -65.9319) -> (-30.0929, -71.3291) centre (-26.4491, -69.7406) ccw projected
  line L94 (-25.3114, -65.9319) -> (-22.9435, -66.6392) projected
  arc A94 (-22.9435, -66.6392) -> (-20.7891, -63.8893) centre (-105.17, 0) ccw projected
  line L95 (-20.7891, -63.8893) -> (-22.0425, -61.7595) projected
  arc A95 (-17.9464, -55.8253) -> (-22.0425, -61.7595) centre (-18.6168, -59.7434) ccw projected
  line L96 (-17.9464, -55.8253) -> (-15.5106, -56.2421) projected
  arc A96 (-15.5106, -56.2421) -> (-13.7033, -53.2525) centre (-105.17, 0) ccw projected
  line L97 (-13.7033, -53.2525) -> (-15.2043, -51.2893) projected
  arc A97 (-11.8534, -44.9046) -> (-15.2043, -51.2893) centre (-12.0466, -48.8749) ccw projected
  line L98 (-11.8534, -44.9046) -> (-9.3851, -45.0247) projected
  arc A98 (-9.3851, -45.0247) -> (-7.9513, -41.8391) centre (-105.17, 0) ccw projected
  line L99 (-7.9513, -41.8391) -> (-9.678, -40.0712) projected
  arc A99 (-7.1211, -33.3292) -> (-9.678, -40.0712) centre (-6.8343, -37.2938) ccw projected
  line L100 (-7.1211, -33.3292) -> (-4.6563, -33.1509) projected
  arc A100 (-4.6563, -33.1509) -> (-3.617, -29.8157) centre (-105.17, 0) ccw projected
  line L101 (-3.617, -29.8157) -> (-5.5442, -28.2688) projected
  arc A101 (-3.8186, -21.2677) -> (-5.5442, -28.2688) centre (-3.056, -25.1688) ccw projected
  line L102 (-3.8186, -21.2677) -> (-1.3933, -20.7936) projected
  arc A102 (-1.3933, -20.7936) -> (-0.7636, -17.3574) centre (-105.17, 0) ccw projected
  line L103 (-0.7636, -17.3574) -> (-2.8632, -16.0541) projected
  arc A103 (-1.9941, -8.896) -> (-2.8632, -16.0541) centre (-0.7668, -12.6768) ccw projected
  circle A104 centre (-105.17, 0) radius 8.5 projected
  circle A105 centre (-105.17, 0) radius 8.5 projected
  line L104 (-105.1595, -17.45) -> (-105.1595, -15.45)
  arc A106 (-102.5095, -17.246) -> (-107.8095, -17.2492) centre (-105.1588, -18.3021) ccw
  line L105 (-107.8095, -16.9169) -> (-107.8095, -17.9831) construction
  line L106 (-102.5095, -17.9831) -> (-102.5095, -16.9169) construction
  line L107 (-107.8095, -17.9831) -> (-102.5095, -17.9831) construction
  line L108 (-107.8095, -16.9169) -> (-102.5095, -17.9831) construction
  line L109 (-102.5095, -16.9169) -> (-107.8095, -17.9831) construction
  line L110 (-102.5095, -16.9169) -> (-107.8095, -16.9169) construction
  arc A107 (-121.4357, 6.3189) -> (-118.7885, 10.9105) centre (-121.0257, 9.1414) ccw
  arc A108 (-107.8305, 17.246) -> (-102.5305, 17.2492) centre (-105.1812, 18.3021) ccw
  arc A109 (-91.5648, 10.9271) -> (-88.912, 6.3388) centre (-89.3255, 9.1607) ccw
  arc A110 (-88.9043, -6.3189) -> (-91.5515, -10.9105) centre (-89.3143, -9.1414) ccw
  arc A111 (-118.7752, -10.9271) -> (-121.428, -6.3388) centre (-121.0145, -9.1607) ccw
  circle A112 centre (-105.17, 0) radius 20
  circle A113 centre (-105.17, 0) radius 17.45
  circle A114 centre (-105.17, 0) radius 8.5
  circle A115 centre (-105.17, 0) radius 24.5
  circle A116 centre (-105.17, 0) radius 23
  circle A117 centre (-105.17, 0) radius 24.5
  circle A118 centre (-105.17, 0) radius 22.5
  point P0 (-118.5554, 7.7159)
  point P1 (-105.1805, 15.45)
  point P2 (-91.7952, 7.7341)
  point P3 (-91.7846, -7.7159)
  point P4 (-118.5448, -7.7341)
  point P5 (-91.5515, -10.9105)
  point P6 (-88.9043, -6.3189)
  point P7 (-88.912, 6.3388)
  point P8 (-91.5648, 10.9271)
  point P9 (-102.5305, 17.2492)
  point P10 (-107.8305, 17.246)
  point P11 (-118.7885, 10.9105)
  point P12 (-121.4357, 6.3189)
  point P13 (-121.428, -6.3388)
  point P14 (-118.7752, -10.9271)
  dimension "d20" = 34.9
  dimension "d21" = 2
  dimension "d22" = 5.3
  dimension "d23" = 360
  dimension "d24" = 40
  dimension "d25" = 49
  dimension "d26" = 46
  dimension "d29" = 2
extrude "押し出し2" cut sketch "スケッチ4" against normal through all contours A106 A113 A111 A107 A108 A109 A110
sketch "スケッチ5" plane through (3.2, 18.9574, -103.4473) normal (1, 0, 0) x (0, 0.180255, -0.9836199)
  circle A0 centre (-107.7065, 69.9311) radius 15
  circle A1 centre (-105.17, 0) radius 90
  circle A2 centre (-105.17, 0) radius 30
  dimension "d30" = 30
  dimension "d31" = 180
  dimension "d32" = 60
extrude "押し出し3" cut sketch "スケッチ5" against normal blind 0.4
extrude "押し出し4" cut sketch "スケッチ5" against normal through all contours A0
pattern_circular "円形状パターン1" count 6 over 360 about axis through (3.2, 0, 0) along (-1, 0, 0) of "押し出し4"
sketch "スケッチ6" plane through (2.8, 0, 0) normal (1, 0, 0) x (0, 0, -1)
  circle A0 centre (-15.1004, 68.3284) radius 15 projected
  circle A1 centre (-66.7243, 21.0869) radius 15 projected
  line L0 (-66.7243, 21.0869) -> (-15.1004, 68.3284)
  circle A2 centre (-31.4807, 34.4011) radius 10
  point P0 (0, 0)
  dimension "d40" = 20
extrude "押し出し5" cut sketch "スケッチ6" against normal through all contours A2
pattern_circular "円形状パターン2" count 6 over 360 about axis through (3.2, 0, 0) along (-1, 0, 0) of "押し出し5"
sketch "スケッチ7" plane through (2.8, 0, 0) normal (1, 0, 0) x (0, 0, -1)
  circle A0 centre (0, 0) radius 34.0862
  circle A1 centre (0, 0) radius 115.853
extrude "押し出し6" cut sketch "スケッチ7" along normal mid plane 10
properties part number "KANA40A52D17_6-D25_PCD124.6(H 7 D 0/+0.1 25 N/A)"
